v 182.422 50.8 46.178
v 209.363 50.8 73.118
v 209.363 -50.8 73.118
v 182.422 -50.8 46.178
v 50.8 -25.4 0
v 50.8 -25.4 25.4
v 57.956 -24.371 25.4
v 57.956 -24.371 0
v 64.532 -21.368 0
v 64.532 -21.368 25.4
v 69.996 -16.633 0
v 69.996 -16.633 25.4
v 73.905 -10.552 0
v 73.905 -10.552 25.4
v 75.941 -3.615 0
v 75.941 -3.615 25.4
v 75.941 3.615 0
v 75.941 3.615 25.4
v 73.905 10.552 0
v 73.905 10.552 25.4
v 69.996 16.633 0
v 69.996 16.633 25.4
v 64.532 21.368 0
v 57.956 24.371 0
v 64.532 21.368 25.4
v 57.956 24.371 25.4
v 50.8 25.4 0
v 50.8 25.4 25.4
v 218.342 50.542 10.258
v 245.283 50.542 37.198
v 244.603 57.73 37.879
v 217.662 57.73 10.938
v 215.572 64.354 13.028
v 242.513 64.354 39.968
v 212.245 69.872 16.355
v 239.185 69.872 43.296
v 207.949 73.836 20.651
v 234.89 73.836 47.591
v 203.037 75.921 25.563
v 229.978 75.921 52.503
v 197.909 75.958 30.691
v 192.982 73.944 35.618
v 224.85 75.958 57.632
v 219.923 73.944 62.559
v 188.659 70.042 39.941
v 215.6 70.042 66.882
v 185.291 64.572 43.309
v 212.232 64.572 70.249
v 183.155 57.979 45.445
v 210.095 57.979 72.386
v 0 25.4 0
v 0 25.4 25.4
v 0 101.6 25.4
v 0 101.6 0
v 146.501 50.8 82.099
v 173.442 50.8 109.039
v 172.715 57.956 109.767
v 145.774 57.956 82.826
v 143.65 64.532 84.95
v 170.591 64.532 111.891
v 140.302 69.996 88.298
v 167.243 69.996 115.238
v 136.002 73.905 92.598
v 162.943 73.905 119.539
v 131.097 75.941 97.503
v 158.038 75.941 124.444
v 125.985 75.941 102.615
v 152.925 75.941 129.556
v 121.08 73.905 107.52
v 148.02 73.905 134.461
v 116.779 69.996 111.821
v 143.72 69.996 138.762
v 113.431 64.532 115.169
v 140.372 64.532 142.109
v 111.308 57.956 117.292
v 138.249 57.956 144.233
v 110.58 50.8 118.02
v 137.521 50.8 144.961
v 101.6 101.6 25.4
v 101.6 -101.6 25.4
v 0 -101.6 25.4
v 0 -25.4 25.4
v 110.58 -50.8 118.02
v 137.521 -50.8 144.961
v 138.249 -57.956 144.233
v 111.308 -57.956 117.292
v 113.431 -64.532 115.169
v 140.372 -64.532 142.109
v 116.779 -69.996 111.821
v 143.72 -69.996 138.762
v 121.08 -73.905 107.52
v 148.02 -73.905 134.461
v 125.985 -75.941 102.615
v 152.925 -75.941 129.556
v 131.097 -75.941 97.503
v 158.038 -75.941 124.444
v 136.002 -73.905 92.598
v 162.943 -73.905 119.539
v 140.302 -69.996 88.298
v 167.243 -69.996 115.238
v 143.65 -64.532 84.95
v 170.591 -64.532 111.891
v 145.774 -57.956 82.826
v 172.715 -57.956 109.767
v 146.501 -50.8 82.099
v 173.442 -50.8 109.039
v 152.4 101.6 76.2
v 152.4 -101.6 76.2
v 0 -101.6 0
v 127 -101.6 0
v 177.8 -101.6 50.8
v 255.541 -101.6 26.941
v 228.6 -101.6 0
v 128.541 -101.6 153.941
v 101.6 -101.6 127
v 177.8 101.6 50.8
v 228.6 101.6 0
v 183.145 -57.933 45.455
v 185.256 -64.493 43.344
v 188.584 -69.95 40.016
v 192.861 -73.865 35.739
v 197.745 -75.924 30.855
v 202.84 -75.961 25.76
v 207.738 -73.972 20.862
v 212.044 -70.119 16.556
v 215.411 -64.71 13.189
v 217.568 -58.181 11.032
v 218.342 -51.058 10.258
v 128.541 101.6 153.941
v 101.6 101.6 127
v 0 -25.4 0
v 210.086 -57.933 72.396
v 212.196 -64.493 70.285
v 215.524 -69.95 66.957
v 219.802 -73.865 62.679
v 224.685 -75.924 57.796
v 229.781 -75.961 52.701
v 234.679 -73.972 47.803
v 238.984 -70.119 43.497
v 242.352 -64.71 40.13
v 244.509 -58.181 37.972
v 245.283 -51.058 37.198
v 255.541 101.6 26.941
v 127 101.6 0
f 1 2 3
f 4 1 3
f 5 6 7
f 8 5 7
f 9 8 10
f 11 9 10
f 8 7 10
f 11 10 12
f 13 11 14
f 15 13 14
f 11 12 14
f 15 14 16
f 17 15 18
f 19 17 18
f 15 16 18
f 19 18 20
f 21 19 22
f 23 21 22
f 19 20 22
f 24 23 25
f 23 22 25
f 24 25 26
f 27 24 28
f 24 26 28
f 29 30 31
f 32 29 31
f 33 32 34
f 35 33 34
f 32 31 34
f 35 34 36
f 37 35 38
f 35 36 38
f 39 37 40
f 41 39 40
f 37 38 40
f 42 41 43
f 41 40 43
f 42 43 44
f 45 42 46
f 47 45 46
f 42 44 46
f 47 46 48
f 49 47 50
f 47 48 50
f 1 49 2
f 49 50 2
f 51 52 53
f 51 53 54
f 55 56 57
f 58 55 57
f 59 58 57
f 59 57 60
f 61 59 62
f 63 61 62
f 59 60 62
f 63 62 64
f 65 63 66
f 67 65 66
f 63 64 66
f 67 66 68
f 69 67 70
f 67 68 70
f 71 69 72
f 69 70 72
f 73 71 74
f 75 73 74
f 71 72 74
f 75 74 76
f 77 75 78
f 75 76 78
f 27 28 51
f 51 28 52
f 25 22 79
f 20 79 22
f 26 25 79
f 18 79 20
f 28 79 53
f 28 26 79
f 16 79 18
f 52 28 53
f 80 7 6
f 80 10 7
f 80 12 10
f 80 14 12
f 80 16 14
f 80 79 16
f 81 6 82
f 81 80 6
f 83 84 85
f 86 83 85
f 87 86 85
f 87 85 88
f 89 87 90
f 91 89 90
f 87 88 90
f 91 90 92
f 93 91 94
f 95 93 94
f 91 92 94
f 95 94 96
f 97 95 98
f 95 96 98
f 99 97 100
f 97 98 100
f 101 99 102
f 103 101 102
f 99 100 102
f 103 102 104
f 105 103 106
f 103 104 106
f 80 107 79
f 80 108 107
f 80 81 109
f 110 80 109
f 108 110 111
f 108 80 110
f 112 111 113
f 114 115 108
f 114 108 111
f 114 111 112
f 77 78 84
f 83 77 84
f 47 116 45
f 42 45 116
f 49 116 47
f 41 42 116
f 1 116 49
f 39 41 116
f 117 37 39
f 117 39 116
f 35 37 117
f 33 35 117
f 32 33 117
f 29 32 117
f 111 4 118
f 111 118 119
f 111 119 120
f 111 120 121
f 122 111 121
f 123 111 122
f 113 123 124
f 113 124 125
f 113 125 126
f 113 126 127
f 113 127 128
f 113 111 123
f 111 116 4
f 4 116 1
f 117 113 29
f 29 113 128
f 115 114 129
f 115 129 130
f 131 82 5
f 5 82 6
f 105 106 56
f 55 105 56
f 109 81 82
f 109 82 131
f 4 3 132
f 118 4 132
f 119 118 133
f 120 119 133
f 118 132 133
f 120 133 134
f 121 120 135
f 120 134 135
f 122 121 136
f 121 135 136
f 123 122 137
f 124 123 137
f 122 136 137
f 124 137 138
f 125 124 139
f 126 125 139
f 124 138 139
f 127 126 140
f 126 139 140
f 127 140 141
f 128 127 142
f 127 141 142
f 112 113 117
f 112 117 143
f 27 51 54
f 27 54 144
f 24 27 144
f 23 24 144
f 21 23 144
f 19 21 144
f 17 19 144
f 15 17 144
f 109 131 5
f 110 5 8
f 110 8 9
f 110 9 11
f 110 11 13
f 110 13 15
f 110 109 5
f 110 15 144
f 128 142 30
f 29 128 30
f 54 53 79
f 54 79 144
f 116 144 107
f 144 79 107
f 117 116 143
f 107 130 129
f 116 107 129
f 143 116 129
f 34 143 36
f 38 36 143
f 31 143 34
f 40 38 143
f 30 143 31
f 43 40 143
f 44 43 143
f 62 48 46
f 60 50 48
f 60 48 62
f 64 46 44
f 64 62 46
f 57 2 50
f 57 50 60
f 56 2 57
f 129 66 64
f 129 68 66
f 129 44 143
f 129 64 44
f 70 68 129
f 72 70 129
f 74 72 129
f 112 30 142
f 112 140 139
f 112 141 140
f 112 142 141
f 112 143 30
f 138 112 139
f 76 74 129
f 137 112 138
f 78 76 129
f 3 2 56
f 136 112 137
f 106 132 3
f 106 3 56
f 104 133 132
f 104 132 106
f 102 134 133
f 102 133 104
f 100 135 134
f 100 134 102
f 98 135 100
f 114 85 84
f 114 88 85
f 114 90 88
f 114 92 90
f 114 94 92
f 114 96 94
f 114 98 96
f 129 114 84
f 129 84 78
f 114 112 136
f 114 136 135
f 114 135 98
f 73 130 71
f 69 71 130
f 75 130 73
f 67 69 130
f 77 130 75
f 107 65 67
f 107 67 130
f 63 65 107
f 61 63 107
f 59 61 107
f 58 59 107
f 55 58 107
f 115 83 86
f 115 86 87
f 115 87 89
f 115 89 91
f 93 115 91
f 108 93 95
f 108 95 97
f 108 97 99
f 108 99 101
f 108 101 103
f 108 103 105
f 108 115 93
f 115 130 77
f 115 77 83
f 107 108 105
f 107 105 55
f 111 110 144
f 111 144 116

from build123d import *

# Parameters (mm, degrees)
F1_DEPTH = 101.6
F3_DEPTH = 78.232
F5_DEPTH = 32.512


with BuildPart() as f1:
    # F0 (on Front) → F1 (new body, symmetric)
    with BuildSketch(Plane.XZ):
        Polygon((0, 25.4), (0, 0), (127, 0), (177.8, 50.8), (228.6, 0), (255.540768, 26.940768), (204.740768, 77.740768), (179.340768, 103.140768), (128.540768, 153.940768), (101.6, 127), (152.4, 76.2), (101.6, 25.4), align=None)
    extrude(amount=F1_DEPTH, both=True)

    # F2 (on face) → F3 (cut)
    with BuildSketch(Plane(origin=(141.240768, 0, 141.240768), x_dir=(0.707107, 0, -0.707107), z_dir=(0.707107, 0, 0.707107))):
        with BuildLine():
            Line((-5.260512, 50.8), (-5.260512, -50.8))
            ThreePointArc((-5.260512, -50.8), (20.139488, -76.2), (45.539488, -50.8))
            Line((45.539488, -50.8), (45.539488, 50.8))
            ThreePointArc((45.539488, 50.8), (20.139488, 76.2), (-5.260512, 50.8))
        make_face()
        with BuildLine():
            Line((96.339488, 50.8), (96.339488, -50.8))
            ThreePointArc((96.339488, -50.8), (121.610302, -76.199671), (147.138174, -51.058367))
            Line((147.138174, -51.058367), (147.138174, -50.541633))
            Line((147.138174, -50.541633), (147.138174, 50.541633))
            ThreePointArc((147.138174, 50.541633), (121.868673, 76.199671), (96.339488, 50.8))
        make_face()
    extrude(amount=-F3_DEPTH, mode=Mode.SUBTRACT)

    # F4 (on face) → F5 (cut)
    with BuildSketch(Plane.XY.offset(25.4)):
        with BuildLine():
            Line((50.8, 25.4), (0, 25.4))
            Line((0, 25.4), (0, -25.4))
            Line((0, -25.4), (50.8, -25.4))
            ThreePointArc((50.8, -25.4), (76.2, 0), (50.8, 25.4))
        make_face()
    extrude(amount=-F5_DEPTH, mode=Mode.SUBTRACT)


solid = f1.part
